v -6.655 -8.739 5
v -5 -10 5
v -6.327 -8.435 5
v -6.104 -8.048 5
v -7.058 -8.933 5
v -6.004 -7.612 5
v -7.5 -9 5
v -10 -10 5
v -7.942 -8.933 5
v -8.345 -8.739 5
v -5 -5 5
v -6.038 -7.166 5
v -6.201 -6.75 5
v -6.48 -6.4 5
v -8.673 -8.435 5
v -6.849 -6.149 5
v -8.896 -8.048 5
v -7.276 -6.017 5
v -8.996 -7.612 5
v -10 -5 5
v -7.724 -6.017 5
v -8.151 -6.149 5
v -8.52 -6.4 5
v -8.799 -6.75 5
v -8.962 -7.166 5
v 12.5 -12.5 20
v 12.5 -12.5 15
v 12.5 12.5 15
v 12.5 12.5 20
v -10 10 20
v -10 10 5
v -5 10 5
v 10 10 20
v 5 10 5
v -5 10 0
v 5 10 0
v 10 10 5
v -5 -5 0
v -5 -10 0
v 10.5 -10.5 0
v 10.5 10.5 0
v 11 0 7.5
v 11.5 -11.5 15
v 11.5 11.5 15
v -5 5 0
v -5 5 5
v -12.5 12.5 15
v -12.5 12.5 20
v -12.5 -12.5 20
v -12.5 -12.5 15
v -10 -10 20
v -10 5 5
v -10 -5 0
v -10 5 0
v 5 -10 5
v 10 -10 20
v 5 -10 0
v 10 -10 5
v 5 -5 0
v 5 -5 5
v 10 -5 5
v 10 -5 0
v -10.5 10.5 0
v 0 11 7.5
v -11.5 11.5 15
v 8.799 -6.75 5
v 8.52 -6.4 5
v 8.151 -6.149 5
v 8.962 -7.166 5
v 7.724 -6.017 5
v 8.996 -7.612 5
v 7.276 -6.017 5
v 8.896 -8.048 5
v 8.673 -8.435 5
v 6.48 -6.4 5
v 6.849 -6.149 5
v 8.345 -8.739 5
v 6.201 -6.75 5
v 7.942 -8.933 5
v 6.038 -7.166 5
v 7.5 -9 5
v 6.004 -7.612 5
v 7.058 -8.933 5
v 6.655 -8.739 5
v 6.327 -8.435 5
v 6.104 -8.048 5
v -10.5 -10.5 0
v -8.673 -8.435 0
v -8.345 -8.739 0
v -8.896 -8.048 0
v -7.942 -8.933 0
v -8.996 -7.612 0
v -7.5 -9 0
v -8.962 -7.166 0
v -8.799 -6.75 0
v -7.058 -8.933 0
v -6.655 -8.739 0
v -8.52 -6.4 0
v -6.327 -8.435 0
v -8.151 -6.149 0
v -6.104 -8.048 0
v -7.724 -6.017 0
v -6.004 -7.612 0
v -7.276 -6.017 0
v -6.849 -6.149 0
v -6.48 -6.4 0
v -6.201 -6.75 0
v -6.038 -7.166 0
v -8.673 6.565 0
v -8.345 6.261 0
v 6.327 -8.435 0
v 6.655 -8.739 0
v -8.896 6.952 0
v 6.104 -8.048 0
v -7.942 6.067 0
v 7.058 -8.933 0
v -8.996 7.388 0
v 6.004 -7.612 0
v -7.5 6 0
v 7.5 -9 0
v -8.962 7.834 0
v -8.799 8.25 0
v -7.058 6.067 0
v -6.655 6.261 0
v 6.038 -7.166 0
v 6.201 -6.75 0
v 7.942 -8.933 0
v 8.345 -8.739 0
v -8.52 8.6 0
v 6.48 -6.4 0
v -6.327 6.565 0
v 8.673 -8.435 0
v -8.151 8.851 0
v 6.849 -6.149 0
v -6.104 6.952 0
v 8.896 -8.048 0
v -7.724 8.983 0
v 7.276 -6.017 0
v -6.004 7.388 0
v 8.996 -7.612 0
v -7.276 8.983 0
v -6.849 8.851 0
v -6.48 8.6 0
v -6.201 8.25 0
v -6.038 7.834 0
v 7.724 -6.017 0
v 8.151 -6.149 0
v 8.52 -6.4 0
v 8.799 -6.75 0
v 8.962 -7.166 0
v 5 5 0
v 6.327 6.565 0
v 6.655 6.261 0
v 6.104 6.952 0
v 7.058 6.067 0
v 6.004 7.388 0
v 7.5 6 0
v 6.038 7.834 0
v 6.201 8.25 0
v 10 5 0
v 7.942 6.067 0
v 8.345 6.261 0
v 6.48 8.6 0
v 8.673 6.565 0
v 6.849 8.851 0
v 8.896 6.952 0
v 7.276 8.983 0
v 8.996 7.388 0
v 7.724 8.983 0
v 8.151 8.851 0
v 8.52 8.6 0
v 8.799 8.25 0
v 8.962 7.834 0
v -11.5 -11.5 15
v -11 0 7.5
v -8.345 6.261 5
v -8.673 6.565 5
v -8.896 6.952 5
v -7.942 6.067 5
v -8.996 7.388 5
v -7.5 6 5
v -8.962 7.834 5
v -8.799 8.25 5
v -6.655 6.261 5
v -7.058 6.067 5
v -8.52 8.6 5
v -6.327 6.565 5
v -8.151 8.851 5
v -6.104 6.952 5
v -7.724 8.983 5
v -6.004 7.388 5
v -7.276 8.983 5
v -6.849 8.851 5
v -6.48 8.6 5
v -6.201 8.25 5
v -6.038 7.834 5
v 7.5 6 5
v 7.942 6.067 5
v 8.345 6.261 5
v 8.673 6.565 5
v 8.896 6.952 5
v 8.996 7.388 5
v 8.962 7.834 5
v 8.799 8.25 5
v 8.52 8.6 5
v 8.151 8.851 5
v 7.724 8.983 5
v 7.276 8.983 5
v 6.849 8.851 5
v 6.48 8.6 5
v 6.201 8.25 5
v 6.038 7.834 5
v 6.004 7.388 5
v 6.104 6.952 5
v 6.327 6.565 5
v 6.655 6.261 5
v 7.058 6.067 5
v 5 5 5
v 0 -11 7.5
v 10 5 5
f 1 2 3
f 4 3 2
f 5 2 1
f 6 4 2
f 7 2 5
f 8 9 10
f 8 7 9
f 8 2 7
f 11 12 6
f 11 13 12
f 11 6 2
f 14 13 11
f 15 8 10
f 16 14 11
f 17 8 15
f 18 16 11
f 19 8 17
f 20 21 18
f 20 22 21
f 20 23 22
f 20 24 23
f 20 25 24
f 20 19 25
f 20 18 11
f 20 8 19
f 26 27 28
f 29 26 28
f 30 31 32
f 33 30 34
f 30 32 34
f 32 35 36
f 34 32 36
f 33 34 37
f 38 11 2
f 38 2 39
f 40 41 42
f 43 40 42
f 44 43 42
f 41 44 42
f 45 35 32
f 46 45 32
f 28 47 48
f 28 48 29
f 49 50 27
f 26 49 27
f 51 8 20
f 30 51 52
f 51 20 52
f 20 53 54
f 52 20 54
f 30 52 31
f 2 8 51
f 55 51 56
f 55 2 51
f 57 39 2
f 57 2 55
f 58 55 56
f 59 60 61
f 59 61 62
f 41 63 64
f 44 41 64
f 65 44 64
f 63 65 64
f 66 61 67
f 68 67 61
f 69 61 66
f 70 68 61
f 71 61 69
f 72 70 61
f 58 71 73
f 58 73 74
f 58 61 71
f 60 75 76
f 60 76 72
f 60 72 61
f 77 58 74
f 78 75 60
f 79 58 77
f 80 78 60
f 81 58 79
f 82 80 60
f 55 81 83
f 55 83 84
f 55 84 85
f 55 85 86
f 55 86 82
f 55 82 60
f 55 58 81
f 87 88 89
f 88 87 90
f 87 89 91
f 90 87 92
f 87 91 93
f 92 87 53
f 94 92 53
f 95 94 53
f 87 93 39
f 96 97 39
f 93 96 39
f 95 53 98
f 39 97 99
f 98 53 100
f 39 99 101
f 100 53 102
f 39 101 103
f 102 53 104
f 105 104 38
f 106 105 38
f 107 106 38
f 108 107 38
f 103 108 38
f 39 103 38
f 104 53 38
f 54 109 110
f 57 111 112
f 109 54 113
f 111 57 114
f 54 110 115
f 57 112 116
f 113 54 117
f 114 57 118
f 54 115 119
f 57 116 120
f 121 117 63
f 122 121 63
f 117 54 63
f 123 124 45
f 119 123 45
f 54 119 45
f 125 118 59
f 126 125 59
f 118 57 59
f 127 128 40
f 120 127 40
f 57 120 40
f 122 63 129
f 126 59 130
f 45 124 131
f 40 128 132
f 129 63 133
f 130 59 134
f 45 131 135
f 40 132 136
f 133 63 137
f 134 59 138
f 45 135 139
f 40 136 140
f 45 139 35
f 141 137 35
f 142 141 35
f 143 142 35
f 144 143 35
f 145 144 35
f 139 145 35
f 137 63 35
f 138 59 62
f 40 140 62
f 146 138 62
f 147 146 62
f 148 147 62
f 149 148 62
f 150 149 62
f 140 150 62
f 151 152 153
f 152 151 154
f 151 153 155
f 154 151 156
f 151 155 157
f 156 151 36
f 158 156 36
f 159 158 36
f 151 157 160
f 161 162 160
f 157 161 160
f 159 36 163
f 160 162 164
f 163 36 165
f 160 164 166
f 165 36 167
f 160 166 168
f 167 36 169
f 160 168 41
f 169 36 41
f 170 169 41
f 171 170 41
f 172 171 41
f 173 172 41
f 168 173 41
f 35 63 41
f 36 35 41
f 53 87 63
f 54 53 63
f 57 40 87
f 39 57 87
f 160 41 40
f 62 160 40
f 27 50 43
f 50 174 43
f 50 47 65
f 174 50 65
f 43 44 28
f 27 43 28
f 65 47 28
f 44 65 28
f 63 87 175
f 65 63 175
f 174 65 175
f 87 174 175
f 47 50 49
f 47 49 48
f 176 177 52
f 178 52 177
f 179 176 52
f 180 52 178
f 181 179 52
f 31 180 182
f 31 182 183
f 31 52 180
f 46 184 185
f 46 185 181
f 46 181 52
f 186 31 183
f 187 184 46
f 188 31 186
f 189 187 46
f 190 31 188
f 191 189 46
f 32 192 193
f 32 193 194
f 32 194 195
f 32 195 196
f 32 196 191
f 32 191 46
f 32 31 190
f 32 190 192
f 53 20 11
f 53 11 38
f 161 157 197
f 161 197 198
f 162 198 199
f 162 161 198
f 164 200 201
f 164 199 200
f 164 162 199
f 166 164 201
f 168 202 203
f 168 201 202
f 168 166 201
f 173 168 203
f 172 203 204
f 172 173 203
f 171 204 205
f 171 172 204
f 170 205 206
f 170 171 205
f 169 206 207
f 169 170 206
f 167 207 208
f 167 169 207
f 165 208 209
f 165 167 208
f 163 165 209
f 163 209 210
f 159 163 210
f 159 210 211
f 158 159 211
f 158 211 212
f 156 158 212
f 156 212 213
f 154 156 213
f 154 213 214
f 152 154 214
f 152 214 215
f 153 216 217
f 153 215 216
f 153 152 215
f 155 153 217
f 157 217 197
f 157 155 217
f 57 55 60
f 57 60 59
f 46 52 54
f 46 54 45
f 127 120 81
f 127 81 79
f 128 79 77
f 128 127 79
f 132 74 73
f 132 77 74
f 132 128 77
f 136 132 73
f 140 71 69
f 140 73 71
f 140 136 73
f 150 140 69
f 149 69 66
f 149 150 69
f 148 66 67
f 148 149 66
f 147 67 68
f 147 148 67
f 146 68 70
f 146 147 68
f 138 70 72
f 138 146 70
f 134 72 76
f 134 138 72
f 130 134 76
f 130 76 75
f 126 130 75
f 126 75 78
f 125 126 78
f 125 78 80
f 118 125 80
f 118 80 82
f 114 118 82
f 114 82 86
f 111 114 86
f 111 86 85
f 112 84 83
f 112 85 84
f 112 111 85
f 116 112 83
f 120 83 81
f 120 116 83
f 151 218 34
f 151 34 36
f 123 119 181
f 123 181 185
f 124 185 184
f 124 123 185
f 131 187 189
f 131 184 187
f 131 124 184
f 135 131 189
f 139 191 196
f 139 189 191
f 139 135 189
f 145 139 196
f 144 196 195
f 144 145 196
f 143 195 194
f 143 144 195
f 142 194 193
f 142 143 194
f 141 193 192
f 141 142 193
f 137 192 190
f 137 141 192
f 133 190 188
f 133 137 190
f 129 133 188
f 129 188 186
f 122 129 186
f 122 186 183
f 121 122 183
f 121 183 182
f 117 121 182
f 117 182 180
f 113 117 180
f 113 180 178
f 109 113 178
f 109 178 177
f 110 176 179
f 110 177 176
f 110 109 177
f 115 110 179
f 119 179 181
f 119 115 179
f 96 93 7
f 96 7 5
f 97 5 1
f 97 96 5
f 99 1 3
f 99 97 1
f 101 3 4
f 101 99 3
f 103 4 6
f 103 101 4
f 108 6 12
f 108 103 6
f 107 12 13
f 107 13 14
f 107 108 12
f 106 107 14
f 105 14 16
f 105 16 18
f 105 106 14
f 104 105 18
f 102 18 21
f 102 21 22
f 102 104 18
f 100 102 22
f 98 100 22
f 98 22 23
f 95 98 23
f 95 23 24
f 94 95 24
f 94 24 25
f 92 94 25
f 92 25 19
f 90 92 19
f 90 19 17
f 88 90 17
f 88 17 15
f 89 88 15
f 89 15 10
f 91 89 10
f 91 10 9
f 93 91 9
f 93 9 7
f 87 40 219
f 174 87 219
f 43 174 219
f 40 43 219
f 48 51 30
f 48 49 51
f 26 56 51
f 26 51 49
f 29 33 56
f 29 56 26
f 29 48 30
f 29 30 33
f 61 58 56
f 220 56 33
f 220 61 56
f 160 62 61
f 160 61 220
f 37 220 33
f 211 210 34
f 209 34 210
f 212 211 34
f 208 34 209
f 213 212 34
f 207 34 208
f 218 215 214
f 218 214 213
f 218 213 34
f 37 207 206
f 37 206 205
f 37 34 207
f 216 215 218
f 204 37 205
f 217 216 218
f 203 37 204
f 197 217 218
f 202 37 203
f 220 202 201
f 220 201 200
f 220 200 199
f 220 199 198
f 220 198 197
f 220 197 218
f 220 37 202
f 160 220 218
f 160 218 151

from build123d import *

# Parameters (mm, degrees)
SKETCH_W          = 25
SKETCH_H          = 25
PAD_DEPTH         = 15
SKETCH002_W       = 21
SKETCH002_H       = 21
SKETCH001_W       = 23
SKETCH001_H       = 23
SKETCH004_W       = 25
SKETCH004_H       = 25
PAD001_DEPTH      = 20
BOX_W             = 20
BOX_H             = 20
BOX_DEPTH         = 21
BOX001_W          = 5
BOX001_H          = 5
BOX001_DEPTH      = 5
BOX002_W          = 5
BOX002_H          = 5
BOX002_DEPTH      = 5
BOX003_W          = 5
BOX003_H          = 5
BOX003_DEPTH      = 5
BOX004_W          = 5
BOX004_H          = 5
BOX004_DEPTH      = 5
CYLINDER_R        = 1.5
CYLINDER_DEPTH    = 10
CYLINDER001_R     = 1.5
CYLINDER001_DEPTH = 10
CYLINDER002_R     = 1.5
CYLINDER002_DEPTH = 10
CYLINDER003_R     = 1.5
CYLINDER003_DEPTH = 13


with BuildPart() as body:
    # Sketch → Pad (new body)
    with BuildSketch(Plane.XY):
        Rectangle(SKETCH_W, SKETCH_H)
    extrude(amount=PAD_DEPTH)

    # Sketch002 (on Face5 of Pad) → SubtractiveLoft section 0
    with BuildSketch(Plane(origin=(0, 0, 0), x_dir=(1, 0, 0), z_dir=(0, 0, -1))):
        Rectangle(SKETCH002_W, SKETCH002_H)
    # Sketch001 (on Face6 of Pad) → SubtractiveLoft section 1
    with BuildSketch(Plane.XY.offset(15)):
        Rectangle(SKETCH001_W, SKETCH001_H)
    loft(mode=Mode.SUBTRACT)


with BuildPart() as body001:
    # Sketch004 → Pad001 (new body)
    with BuildSketch(Plane.XY):
        Rectangle(SKETCH004_W, SKETCH004_H)
    extrude(amount=PAD001_DEPTH)

    # Boolean: cut Body
    add(body.part, mode=Mode.SUBTRACT)

    # Box → Box (cut)
    with BuildSketch(Plane(origin=(-10, -10, 0), x_dir=(1, 0, 0), z_dir=(0, 0, 1))):
        with Locations((10, 10)):
            Rectangle(BOX_W, BOX_H)
    extrude(amount=BOX_DEPTH, mode=Mode.SUBTRACT)

    # Box001 → Box001 (join)
    with BuildSketch(Plane(origin=(-10, 10, 0), x_dir=(1, 0, 0), z_dir=(0, -1, 0))):
        with Locations((2.5, 2.5)):
            Rectangle(BOX001_W, BOX001_H)
    extrude(amount=BOX001_DEPTH)

    # Box002 → Box002 (join)
    with BuildSketch(Plane(origin=(10, 10, 5), x_dir=(0, 0, -1), z_dir=(-1, 0, 0))):
        with Locations((2.5, 2.5)):
            Rectangle(BOX002_W, BOX002_H)
    extrude(amount=BOX002_DEPTH)

    # Box003 → Box003 (join)
    with BuildSketch(Plane(origin=(10, -10, 5), x_dir=(0, 0, -1), z_dir=(0, 1, 0))):
        with Locations((2.5, 2.5)):
            Rectangle(BOX003_W, BOX003_H)
    extrude(amount=BOX003_DEPTH)

    # Box004 → Box004 (join)
    with BuildSketch(Plane(origin=(-10, -10, 5), x_dir=(0, 0, -1), z_dir=(1, 0, 0))):
        with Locations((2.5, 2.5)):
            Rectangle(BOX004_W, BOX004_H)
    extrude(amount=BOX004_DEPTH)

    # Cylinder → Cylinder (cut)
    with BuildSketch(Plane(origin=(-7.5, 7.5, -1.5), x_dir=(0, -1, 0), z_dir=(0, 0, 1))):
        Circle(CYLINDER_R)
    extrude(amount=CYLINDER_DEPTH, mode=Mode.SUBTRACT)

    # Cylinder001 → Cylinder001 (cut)
    with BuildSketch(Plane(origin=(7.5, 7.5, -3), x_dir=(0, -1, 0), z_dir=(0, 0, 1))):
        Circle(CYLINDER001_R)
    extrude(amount=CYLINDER001_DEPTH, mode=Mode.SUBTRACT)

    # Cylinder002 → Cylinder002 (cut)
    with BuildSketch(Plane(origin=(7.5, -7.5, -4), x_dir=(0, -1, 0), z_dir=(0, 0, 1))):
        Circle(CYLINDER002_R)
    extrude(amount=CYLINDER002_DEPTH, mode=Mode.SUBTRACT)

    # Cylinder003 → Cylinder003 (cut)
    with BuildSketch(Plane(origin=(-7.5, -7.5, -8), x_dir=(0, -1, 0), z_dir=(0, 0, 1))):
        Circle(CYLINDER003_R)
    extrude(amount=CYLINDER003_DEPTH, mode=Mode.SUBTRACT)


solid = body001.part
